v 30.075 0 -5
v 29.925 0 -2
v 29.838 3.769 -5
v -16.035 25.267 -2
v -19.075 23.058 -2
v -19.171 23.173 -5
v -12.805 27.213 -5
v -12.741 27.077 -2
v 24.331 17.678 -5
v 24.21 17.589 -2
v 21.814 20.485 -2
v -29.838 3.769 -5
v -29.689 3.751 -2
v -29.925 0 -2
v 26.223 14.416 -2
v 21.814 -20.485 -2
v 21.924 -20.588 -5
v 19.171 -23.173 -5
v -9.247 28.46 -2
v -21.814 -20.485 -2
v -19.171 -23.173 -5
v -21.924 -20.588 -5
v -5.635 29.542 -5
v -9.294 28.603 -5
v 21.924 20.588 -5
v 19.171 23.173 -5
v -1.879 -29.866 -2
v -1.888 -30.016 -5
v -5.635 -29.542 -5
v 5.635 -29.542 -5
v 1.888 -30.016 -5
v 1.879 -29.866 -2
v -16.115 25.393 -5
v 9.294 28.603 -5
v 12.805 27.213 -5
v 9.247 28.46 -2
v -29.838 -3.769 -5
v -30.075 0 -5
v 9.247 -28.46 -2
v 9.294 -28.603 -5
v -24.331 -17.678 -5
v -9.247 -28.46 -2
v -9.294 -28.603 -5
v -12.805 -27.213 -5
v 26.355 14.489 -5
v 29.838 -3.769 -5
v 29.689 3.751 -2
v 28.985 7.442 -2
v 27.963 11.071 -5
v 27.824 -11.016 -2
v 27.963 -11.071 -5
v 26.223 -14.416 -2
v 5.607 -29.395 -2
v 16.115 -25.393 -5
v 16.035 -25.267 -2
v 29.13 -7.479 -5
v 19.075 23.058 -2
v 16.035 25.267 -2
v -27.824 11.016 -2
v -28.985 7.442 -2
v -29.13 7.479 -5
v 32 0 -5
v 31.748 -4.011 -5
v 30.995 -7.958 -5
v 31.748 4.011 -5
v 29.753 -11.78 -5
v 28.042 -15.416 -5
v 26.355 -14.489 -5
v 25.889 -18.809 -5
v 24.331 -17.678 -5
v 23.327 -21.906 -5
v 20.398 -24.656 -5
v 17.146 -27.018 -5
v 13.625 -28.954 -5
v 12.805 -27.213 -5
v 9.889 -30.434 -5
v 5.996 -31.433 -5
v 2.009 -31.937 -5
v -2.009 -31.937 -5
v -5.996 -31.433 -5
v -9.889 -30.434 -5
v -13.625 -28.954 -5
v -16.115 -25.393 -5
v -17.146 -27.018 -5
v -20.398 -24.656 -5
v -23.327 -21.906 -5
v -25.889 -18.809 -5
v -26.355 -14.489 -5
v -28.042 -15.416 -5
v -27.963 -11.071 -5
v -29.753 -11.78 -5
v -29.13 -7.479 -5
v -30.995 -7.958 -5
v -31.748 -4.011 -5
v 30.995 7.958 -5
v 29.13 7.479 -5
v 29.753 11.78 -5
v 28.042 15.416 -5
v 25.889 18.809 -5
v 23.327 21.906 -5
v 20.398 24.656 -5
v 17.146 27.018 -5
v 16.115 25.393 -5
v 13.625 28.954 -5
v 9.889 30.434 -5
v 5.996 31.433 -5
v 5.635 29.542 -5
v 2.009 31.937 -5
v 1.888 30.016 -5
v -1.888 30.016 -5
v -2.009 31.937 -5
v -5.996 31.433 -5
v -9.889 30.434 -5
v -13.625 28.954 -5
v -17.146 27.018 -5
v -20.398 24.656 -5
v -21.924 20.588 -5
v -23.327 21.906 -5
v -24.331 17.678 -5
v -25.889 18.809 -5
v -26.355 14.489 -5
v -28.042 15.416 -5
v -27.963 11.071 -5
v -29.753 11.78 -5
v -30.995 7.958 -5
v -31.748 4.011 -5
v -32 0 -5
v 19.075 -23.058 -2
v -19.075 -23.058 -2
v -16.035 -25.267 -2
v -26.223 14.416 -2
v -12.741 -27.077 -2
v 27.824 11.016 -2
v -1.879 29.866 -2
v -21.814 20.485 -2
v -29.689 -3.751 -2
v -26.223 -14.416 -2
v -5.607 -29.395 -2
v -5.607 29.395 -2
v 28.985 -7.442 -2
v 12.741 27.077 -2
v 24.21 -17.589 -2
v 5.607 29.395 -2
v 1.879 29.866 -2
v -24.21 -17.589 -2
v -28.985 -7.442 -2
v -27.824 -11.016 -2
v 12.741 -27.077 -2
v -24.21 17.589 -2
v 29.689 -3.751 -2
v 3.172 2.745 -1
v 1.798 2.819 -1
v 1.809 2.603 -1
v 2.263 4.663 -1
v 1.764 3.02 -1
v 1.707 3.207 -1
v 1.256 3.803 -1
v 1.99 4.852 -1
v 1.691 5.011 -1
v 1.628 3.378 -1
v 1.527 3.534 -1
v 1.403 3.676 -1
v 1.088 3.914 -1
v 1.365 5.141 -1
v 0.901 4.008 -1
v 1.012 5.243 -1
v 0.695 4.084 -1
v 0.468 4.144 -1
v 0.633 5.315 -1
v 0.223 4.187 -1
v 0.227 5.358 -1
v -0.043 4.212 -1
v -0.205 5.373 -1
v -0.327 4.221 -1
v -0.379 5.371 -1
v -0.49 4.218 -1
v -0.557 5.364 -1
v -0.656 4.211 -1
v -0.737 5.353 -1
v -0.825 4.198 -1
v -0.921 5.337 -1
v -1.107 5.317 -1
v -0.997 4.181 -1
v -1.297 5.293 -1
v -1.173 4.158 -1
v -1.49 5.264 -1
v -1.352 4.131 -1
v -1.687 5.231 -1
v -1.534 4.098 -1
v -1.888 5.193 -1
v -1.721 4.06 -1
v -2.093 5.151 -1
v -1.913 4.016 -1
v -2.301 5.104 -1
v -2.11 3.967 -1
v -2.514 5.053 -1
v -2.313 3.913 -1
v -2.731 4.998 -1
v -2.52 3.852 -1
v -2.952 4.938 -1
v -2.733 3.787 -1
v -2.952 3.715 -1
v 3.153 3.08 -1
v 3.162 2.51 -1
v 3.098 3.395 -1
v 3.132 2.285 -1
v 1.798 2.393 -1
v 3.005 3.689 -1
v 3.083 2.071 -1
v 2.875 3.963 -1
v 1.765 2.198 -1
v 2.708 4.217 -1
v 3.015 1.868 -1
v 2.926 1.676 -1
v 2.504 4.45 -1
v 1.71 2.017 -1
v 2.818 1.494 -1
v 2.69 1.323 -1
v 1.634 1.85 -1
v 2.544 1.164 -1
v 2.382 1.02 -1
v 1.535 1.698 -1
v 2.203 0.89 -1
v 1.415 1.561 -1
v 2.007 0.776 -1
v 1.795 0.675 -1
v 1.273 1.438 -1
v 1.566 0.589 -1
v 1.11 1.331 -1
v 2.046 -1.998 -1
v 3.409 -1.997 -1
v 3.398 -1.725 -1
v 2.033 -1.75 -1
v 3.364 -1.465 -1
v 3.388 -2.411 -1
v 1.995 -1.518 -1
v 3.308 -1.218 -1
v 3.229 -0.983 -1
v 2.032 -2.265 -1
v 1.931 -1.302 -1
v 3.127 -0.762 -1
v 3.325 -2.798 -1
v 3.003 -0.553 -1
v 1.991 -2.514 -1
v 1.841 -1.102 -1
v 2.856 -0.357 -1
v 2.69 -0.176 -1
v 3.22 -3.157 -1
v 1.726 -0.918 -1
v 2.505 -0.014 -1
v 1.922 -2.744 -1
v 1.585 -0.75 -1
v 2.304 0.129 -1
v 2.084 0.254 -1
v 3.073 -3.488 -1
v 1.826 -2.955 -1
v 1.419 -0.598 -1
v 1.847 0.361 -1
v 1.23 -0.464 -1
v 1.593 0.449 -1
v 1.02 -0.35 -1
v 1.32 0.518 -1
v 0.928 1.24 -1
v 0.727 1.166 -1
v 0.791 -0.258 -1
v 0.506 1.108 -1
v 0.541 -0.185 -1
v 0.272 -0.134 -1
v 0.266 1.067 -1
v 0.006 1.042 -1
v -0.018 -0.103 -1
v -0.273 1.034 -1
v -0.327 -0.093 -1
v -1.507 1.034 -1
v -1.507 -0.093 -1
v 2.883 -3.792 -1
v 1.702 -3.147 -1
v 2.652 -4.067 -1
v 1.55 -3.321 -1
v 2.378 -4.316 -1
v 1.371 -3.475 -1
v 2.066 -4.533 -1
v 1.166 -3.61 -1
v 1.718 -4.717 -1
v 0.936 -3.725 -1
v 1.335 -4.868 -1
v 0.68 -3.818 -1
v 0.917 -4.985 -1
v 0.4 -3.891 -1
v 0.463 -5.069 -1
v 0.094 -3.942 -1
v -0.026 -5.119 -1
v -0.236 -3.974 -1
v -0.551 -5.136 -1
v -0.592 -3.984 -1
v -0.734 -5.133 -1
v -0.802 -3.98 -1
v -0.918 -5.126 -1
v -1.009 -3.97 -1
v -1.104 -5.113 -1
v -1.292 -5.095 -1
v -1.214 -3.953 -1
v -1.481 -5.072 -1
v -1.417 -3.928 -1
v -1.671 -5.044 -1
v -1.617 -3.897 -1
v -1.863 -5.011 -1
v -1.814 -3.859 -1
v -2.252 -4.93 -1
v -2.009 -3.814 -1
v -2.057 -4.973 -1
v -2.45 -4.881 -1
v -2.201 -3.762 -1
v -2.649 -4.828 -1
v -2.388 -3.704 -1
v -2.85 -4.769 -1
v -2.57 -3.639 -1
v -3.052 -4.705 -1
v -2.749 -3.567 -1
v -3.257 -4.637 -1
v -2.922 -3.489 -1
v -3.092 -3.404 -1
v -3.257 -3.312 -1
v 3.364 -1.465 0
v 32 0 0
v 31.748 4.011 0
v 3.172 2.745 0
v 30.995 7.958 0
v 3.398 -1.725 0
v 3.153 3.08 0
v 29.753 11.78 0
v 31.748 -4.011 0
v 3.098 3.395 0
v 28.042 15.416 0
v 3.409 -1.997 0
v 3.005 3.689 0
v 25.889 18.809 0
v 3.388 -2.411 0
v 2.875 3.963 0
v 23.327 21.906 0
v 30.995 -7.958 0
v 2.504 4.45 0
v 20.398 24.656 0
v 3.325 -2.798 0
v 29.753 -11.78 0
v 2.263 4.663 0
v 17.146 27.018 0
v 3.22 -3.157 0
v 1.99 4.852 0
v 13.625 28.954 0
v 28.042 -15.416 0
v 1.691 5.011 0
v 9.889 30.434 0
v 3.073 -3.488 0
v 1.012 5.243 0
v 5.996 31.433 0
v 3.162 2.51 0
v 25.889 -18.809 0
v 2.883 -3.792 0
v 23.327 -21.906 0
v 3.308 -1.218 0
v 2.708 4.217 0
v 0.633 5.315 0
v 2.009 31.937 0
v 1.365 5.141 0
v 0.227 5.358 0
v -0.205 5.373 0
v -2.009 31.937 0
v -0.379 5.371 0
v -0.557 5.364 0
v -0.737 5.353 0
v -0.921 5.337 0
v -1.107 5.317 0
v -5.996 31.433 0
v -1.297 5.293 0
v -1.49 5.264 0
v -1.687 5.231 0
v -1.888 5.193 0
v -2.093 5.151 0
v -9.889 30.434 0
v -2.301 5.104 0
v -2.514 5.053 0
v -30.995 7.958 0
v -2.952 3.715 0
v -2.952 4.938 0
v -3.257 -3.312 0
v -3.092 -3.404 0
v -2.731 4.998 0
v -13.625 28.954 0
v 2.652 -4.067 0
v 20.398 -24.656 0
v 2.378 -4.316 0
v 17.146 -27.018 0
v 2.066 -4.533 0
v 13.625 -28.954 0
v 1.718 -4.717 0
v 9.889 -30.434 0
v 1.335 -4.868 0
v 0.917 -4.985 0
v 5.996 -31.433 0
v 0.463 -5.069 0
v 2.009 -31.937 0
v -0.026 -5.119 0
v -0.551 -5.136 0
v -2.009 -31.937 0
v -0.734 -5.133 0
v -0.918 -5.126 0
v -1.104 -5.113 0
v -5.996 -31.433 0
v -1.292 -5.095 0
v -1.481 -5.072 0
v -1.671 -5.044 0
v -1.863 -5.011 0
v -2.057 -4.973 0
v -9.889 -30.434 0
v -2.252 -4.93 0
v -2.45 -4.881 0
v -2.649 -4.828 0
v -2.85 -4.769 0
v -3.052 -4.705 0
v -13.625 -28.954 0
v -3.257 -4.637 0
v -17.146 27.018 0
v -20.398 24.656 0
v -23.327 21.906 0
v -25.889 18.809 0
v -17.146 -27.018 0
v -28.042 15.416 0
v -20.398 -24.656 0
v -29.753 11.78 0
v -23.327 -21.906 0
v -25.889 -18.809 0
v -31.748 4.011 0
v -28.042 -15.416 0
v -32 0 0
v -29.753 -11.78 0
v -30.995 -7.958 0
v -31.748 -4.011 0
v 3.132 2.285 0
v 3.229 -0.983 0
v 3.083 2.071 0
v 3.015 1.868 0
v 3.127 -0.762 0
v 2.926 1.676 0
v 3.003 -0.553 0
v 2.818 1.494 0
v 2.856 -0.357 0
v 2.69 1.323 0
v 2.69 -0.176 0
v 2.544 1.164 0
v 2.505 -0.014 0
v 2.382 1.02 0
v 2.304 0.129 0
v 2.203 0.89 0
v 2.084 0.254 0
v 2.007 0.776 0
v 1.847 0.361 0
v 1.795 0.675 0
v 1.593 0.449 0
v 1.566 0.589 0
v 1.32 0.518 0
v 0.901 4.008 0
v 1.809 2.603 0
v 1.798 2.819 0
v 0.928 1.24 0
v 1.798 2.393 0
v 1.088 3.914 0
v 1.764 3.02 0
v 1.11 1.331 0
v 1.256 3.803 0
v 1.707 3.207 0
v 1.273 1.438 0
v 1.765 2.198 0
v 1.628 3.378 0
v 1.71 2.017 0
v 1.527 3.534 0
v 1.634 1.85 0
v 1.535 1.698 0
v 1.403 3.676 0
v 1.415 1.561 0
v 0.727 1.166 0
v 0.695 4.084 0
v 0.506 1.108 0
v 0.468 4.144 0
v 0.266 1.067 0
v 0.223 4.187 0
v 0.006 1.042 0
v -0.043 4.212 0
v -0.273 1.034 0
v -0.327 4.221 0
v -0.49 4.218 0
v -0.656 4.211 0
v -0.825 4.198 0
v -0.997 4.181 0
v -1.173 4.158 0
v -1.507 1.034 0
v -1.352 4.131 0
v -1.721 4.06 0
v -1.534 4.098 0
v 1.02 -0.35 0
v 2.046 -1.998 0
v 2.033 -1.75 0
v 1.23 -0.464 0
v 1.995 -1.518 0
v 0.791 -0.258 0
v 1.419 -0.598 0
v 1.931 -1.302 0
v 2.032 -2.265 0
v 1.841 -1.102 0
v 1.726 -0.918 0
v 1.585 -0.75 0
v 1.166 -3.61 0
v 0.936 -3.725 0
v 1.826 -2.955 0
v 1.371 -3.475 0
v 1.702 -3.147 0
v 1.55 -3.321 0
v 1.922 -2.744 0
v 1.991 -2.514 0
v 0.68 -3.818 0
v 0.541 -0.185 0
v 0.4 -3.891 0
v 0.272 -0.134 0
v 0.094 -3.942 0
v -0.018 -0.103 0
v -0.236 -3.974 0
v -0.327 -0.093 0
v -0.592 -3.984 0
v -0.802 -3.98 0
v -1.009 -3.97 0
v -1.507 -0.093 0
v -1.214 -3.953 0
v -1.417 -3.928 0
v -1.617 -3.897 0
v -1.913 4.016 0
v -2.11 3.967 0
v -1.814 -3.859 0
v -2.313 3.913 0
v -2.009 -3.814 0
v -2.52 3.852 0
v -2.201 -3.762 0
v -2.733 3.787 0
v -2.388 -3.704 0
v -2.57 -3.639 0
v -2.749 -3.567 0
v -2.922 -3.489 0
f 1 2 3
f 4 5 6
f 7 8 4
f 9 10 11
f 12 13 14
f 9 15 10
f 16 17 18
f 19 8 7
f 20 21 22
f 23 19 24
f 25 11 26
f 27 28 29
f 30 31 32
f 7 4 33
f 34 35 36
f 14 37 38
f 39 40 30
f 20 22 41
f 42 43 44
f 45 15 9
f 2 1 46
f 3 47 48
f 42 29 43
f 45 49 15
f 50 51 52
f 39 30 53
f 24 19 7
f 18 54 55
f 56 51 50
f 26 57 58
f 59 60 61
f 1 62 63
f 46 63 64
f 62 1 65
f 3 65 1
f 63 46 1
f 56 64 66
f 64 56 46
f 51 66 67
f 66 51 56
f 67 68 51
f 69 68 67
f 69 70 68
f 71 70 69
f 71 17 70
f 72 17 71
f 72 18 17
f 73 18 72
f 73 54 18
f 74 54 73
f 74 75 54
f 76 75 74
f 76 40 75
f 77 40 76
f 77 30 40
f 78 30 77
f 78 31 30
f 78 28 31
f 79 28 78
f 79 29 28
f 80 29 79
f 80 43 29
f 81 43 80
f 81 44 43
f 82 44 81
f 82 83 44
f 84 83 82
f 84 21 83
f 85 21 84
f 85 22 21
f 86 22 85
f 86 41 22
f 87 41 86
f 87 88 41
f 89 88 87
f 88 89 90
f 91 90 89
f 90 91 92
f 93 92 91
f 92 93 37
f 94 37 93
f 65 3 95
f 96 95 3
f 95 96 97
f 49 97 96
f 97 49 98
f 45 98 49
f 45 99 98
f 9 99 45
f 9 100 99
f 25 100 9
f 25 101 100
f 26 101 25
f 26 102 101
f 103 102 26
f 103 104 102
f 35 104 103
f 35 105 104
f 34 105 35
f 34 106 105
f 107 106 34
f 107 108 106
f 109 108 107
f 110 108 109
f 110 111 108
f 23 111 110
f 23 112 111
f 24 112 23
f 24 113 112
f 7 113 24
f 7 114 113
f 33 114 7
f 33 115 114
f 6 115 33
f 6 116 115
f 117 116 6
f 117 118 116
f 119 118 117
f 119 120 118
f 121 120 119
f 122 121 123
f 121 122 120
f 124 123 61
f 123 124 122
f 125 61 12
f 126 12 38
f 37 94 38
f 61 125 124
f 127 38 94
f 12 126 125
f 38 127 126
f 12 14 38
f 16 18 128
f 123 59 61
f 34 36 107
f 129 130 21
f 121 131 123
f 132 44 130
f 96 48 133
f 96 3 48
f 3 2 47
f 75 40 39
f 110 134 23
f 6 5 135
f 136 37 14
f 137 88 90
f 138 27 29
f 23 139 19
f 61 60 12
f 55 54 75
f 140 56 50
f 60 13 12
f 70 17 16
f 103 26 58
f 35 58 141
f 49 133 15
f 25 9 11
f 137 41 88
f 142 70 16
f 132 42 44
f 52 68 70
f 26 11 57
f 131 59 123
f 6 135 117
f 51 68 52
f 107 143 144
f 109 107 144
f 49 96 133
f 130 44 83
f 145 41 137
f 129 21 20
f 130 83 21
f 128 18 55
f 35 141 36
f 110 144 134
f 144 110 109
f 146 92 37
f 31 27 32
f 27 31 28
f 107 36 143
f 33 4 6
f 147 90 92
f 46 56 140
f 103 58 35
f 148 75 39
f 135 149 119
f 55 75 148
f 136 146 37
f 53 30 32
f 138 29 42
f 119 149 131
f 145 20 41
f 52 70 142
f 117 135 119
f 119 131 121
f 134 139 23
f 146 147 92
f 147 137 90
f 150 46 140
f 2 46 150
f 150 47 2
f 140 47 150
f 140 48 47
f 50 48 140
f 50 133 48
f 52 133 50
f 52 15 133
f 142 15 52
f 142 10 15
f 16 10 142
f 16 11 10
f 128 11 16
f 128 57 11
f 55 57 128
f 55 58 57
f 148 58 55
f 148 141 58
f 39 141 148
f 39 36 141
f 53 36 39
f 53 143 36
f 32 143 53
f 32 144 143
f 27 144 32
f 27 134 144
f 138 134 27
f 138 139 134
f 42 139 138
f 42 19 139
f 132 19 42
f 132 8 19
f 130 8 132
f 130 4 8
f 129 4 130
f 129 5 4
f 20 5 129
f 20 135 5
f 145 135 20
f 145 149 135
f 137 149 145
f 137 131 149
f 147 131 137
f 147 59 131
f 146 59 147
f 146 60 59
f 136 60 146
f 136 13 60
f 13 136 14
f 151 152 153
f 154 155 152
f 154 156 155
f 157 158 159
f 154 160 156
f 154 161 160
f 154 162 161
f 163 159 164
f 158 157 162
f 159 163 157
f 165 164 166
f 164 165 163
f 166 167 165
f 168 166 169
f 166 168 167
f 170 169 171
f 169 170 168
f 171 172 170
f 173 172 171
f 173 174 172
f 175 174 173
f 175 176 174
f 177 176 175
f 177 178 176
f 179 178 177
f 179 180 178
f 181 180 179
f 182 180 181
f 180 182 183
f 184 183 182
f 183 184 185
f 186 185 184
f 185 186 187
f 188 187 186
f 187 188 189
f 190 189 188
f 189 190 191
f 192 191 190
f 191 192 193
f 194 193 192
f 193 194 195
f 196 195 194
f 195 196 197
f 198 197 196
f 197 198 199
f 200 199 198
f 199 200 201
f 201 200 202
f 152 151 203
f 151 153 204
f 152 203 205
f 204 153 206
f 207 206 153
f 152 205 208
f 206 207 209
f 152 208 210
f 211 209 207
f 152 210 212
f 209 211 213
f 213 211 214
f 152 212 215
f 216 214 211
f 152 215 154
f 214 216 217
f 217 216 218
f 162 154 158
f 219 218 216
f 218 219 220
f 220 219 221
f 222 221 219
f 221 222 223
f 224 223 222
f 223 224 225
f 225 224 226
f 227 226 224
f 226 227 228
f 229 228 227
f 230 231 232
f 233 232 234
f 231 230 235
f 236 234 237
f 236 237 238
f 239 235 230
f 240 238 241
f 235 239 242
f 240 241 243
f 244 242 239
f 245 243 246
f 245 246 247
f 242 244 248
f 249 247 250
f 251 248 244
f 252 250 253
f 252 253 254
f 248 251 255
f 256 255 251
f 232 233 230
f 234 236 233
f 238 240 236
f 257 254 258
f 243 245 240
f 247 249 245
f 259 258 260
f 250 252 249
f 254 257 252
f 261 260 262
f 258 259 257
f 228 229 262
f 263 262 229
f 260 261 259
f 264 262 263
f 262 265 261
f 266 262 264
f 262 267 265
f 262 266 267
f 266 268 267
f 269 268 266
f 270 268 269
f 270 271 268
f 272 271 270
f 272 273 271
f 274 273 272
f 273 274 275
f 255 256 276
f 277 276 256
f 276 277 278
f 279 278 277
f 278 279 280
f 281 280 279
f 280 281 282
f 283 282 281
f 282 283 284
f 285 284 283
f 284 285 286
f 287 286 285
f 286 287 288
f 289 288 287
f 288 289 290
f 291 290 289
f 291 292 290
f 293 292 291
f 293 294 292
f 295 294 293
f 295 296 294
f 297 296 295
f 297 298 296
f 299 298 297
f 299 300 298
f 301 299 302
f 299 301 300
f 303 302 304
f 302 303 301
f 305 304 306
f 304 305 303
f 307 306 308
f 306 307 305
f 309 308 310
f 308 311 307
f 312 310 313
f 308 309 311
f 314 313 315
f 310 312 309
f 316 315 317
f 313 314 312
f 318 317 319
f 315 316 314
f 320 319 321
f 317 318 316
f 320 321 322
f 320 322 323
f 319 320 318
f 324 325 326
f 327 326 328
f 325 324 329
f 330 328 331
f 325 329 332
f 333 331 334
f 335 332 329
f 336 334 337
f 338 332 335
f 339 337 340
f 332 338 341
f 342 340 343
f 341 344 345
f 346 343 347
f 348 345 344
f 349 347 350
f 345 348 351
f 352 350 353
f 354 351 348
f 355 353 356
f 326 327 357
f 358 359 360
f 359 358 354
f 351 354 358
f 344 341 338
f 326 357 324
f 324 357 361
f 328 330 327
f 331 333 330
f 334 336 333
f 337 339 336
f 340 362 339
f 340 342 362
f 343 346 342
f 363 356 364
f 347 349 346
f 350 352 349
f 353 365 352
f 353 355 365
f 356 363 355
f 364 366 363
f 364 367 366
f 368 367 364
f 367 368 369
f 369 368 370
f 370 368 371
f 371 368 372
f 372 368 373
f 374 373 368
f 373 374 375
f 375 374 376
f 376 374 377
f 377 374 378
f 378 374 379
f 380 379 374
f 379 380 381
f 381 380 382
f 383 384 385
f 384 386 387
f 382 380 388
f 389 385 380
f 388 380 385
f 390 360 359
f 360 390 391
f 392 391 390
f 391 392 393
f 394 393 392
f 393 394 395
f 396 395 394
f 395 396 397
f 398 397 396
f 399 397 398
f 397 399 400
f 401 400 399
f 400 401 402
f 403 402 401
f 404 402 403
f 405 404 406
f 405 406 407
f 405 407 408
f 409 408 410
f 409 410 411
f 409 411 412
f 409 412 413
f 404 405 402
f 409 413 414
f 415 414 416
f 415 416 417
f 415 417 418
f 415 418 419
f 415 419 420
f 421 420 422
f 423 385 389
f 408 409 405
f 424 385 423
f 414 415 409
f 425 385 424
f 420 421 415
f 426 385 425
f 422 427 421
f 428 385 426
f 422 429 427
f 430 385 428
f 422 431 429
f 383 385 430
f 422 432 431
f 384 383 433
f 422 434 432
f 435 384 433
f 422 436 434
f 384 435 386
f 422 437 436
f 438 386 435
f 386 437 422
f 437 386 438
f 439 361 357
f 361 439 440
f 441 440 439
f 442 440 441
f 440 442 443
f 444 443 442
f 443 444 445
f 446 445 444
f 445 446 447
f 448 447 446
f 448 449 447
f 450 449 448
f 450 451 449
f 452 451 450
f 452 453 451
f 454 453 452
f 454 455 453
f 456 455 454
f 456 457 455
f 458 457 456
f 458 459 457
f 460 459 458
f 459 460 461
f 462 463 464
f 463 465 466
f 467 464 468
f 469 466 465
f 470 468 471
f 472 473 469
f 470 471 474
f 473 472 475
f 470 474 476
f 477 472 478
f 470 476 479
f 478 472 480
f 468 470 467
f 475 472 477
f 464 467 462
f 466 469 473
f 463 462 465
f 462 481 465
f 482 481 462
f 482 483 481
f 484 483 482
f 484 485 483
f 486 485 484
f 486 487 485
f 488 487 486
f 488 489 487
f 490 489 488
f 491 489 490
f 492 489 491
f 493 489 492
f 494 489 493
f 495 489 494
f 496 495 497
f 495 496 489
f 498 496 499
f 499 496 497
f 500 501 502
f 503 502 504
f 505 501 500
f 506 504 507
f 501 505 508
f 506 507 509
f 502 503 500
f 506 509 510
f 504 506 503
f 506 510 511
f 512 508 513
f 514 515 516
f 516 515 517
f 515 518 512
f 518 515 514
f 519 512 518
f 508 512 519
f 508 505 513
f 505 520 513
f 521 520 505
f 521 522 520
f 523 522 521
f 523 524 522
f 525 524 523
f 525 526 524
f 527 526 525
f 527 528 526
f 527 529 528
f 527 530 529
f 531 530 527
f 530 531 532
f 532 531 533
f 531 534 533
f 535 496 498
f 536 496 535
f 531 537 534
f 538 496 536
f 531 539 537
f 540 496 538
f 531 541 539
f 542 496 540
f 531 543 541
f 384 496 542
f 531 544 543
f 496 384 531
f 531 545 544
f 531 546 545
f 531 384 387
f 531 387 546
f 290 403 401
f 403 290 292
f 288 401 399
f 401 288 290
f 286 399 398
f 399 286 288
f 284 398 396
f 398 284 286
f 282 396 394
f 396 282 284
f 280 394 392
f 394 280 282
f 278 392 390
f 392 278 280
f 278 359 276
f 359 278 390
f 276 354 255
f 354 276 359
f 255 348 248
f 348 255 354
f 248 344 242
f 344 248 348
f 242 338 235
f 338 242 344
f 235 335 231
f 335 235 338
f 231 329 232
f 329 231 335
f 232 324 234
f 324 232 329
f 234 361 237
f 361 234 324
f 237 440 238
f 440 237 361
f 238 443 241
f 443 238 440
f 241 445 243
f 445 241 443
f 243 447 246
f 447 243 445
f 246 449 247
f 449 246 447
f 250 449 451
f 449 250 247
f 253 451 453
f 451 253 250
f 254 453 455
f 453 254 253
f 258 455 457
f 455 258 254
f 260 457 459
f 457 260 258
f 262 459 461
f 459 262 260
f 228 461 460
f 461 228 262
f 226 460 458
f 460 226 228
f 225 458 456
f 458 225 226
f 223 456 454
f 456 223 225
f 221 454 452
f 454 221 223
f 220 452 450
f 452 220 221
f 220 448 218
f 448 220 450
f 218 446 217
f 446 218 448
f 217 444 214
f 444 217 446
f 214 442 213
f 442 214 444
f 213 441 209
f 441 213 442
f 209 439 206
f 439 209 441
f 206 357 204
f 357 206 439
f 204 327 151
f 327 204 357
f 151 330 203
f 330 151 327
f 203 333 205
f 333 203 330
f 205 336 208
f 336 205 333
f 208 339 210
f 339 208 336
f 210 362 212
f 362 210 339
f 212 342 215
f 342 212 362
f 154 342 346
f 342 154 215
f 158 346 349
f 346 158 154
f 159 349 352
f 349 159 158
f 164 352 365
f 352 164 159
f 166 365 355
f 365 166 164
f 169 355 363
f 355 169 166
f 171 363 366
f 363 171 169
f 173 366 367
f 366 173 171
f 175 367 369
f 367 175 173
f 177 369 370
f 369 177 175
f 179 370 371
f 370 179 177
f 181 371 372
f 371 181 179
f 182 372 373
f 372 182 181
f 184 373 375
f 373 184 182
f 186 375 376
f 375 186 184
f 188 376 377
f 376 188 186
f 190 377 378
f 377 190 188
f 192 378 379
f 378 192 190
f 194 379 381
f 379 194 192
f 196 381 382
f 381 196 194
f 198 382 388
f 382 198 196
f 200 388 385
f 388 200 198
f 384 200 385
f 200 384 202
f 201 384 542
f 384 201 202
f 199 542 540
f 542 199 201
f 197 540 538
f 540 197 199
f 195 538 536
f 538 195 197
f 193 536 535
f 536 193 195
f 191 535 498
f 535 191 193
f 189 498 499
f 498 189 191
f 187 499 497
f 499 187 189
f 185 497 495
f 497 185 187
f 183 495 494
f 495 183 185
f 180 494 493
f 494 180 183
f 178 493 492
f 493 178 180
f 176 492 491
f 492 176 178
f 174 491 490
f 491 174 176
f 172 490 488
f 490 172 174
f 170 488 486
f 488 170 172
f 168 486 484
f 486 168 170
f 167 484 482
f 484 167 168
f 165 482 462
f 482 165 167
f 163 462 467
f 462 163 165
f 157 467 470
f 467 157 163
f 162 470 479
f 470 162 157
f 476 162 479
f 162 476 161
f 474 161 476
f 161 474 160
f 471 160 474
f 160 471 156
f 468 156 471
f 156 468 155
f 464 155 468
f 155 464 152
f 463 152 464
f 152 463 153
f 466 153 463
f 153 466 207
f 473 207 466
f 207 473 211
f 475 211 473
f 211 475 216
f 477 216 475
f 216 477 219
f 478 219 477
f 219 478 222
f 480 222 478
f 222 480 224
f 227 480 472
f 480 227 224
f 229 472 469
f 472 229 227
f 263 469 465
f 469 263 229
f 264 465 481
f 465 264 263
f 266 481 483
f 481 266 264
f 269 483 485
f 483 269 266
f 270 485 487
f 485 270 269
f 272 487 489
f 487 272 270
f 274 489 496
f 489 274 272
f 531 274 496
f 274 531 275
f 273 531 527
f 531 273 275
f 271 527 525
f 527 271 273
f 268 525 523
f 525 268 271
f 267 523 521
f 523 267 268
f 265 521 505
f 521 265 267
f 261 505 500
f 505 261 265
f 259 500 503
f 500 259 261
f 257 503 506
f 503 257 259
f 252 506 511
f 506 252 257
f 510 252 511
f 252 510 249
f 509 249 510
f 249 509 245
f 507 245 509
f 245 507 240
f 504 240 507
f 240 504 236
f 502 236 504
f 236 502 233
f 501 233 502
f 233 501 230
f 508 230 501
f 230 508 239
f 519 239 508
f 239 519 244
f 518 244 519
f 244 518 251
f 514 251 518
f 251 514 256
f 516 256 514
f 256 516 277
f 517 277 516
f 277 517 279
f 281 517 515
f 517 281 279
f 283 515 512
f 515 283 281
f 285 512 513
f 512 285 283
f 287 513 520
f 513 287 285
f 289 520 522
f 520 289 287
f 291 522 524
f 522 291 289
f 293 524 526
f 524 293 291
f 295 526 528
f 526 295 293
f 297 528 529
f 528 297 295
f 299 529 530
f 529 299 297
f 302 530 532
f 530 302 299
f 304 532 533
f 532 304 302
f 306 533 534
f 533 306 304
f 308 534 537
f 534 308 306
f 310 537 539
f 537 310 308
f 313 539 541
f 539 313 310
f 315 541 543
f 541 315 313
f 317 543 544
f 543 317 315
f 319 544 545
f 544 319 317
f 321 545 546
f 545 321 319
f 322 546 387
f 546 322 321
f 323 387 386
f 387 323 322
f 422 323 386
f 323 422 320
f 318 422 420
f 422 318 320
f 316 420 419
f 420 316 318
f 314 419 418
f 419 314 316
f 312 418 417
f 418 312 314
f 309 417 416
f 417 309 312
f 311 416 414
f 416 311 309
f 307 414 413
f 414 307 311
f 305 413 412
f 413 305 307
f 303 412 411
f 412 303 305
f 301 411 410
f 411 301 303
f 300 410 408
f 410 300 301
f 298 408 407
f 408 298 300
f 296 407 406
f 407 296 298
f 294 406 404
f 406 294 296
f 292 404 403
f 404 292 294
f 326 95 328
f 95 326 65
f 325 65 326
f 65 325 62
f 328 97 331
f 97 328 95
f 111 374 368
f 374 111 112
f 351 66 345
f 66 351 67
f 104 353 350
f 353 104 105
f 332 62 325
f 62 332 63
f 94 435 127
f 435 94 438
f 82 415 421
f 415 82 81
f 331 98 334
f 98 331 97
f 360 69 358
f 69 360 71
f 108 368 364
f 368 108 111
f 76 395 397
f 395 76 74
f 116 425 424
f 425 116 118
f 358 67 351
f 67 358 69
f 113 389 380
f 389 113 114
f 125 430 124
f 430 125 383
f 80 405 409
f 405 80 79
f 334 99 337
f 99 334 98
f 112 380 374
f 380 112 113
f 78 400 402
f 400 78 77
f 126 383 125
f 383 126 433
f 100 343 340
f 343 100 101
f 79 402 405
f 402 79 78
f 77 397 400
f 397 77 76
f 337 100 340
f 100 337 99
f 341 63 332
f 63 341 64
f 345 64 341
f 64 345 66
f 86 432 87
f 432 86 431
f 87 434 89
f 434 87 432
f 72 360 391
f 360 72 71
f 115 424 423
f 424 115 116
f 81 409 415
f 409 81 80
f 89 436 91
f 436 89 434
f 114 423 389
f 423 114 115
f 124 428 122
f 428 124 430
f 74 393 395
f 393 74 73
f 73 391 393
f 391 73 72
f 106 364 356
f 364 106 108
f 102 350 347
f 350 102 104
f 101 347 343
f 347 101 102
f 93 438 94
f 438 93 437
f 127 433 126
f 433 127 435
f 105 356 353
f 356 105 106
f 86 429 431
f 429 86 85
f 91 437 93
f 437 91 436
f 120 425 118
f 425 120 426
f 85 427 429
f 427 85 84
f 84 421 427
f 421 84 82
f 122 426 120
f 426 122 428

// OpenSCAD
$fn = 50;


difference() {
	union() {
		translate(v = [0, 0, -5.0000000000]) {
			cylinder(h = 5, r = 32.0000000000);
		}
	}
	union() {
		#translate(v = [0, 0, -5.0000000000]) {
			cylinder(h = 3, r1 = 30.0750000000, r2 = 29.9250000000);
		}
		translate(v = [0, 0, -1]) {
			linear_extrude(height = 1) {
				text(font = "Impact", halign = "center", size = 10, text = "3", valign = "center");
			}
		}
	}
}
